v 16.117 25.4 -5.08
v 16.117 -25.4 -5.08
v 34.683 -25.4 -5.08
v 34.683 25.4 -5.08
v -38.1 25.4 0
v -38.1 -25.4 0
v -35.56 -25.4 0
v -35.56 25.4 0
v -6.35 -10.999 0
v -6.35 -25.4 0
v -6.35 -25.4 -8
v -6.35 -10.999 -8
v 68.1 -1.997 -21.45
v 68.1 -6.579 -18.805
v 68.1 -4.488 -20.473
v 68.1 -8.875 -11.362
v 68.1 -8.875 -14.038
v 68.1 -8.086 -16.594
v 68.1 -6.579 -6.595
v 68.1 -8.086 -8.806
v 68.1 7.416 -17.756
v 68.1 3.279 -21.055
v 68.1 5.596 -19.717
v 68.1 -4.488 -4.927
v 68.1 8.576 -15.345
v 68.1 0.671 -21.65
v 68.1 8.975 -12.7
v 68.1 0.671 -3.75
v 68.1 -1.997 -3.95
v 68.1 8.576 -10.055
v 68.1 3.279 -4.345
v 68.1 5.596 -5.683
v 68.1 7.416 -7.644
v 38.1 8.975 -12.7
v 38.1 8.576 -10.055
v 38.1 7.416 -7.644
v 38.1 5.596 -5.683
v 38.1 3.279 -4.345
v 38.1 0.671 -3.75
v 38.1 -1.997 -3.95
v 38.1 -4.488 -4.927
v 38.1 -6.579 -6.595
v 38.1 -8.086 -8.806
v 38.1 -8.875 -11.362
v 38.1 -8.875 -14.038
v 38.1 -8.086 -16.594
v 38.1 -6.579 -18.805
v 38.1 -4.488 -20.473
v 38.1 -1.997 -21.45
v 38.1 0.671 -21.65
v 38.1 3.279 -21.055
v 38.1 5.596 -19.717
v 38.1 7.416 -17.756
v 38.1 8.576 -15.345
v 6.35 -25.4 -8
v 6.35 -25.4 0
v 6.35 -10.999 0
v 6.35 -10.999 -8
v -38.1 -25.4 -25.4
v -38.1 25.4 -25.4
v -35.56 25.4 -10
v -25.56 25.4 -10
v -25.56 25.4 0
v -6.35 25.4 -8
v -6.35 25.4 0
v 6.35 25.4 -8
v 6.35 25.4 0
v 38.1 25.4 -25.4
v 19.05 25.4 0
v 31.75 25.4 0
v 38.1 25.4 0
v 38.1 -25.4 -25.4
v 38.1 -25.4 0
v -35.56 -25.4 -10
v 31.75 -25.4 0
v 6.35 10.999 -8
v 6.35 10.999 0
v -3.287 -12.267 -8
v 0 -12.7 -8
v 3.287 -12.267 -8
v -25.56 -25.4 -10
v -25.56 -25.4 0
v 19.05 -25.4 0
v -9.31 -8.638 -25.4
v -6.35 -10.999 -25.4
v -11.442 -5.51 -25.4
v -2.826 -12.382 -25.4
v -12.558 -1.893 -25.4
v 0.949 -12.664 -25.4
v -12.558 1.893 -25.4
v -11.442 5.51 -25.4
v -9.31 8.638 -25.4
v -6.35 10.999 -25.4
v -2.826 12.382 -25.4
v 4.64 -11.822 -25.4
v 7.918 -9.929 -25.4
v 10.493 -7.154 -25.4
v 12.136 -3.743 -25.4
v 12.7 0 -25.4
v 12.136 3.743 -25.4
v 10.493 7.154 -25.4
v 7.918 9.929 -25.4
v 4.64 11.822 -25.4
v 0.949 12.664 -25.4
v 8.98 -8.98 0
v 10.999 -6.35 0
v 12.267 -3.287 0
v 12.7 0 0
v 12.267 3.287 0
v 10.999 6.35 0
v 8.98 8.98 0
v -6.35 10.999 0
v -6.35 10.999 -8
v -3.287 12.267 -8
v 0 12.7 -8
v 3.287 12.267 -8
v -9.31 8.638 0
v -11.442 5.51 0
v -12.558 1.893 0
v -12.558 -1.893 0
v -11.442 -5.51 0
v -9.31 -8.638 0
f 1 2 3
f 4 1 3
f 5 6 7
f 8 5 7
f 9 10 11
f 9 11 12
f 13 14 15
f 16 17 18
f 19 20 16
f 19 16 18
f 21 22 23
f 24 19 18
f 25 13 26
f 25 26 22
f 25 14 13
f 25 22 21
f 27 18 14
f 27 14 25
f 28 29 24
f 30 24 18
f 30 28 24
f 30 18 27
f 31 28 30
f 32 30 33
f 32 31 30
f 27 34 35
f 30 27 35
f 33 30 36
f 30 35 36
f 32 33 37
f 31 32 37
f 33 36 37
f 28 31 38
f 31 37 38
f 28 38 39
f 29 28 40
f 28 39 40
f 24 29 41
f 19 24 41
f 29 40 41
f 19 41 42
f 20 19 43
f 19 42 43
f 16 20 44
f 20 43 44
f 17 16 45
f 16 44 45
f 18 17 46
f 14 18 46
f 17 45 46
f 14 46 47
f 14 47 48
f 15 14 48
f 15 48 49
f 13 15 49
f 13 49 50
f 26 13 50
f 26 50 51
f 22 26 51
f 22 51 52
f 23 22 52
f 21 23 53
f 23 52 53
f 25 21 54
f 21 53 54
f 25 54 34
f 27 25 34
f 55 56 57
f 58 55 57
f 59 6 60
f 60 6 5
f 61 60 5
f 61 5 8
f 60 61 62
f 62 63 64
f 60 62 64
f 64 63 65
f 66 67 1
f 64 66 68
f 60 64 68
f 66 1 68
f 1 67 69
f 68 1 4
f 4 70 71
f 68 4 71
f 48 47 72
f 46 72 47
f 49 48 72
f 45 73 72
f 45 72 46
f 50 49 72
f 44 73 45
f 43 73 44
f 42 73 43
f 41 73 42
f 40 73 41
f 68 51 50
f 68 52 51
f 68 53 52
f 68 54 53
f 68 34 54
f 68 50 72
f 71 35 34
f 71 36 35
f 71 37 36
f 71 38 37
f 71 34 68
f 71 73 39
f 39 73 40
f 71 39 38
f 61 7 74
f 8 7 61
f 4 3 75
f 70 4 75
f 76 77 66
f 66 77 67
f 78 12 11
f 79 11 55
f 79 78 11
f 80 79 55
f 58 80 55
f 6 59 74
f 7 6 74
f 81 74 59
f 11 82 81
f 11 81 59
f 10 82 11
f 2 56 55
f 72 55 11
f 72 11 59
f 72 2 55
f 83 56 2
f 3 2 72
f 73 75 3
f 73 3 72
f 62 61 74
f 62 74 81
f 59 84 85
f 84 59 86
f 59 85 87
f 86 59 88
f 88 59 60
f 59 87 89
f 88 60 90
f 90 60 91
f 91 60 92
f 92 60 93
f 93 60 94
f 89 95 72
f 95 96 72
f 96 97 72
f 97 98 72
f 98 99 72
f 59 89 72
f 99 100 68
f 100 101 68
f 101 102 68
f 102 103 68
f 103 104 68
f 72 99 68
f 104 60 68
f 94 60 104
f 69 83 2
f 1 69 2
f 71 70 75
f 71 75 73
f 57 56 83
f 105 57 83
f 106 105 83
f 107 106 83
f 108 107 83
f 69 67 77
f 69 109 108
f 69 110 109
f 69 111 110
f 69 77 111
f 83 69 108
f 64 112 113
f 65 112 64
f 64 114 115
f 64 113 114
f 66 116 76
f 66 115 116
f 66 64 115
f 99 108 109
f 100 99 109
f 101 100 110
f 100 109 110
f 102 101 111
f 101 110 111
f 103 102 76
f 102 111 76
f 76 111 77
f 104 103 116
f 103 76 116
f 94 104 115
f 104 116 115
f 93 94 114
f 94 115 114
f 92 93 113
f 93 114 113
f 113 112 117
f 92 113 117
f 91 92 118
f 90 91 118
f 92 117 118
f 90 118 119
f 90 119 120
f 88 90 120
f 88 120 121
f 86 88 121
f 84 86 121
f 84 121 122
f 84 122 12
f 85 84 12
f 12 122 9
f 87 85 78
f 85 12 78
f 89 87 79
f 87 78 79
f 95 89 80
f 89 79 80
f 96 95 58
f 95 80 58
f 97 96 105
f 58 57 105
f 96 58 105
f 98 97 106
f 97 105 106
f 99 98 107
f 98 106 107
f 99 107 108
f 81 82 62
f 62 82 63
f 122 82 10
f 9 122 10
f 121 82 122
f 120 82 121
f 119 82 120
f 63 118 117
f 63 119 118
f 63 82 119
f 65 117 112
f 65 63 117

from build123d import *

# Parameters (mm, degrees)
F0_W     = 76.2
F0_H     = 50.8
F0_R     = 12.7
F1_DEPTH = 25.4
F2_W     = 10
F2_H     = 50.8
F3_DEPTH = 10
F2_W_2   = 12.7
F4_DEPTH = 8
F5_R     = 8.975174
F6_DEPTH = 30
F8_DEPTH = 50.8


with BuildPart() as f1:
    # F0 (on Top) → F1 (new body)
    with BuildSketch(Plane.XY):
        Rectangle(F0_W, F0_H)
        Circle(F0_R, mode=Mode.SUBTRACT)
    extrude(amount=-F1_DEPTH)

    # F2 (on Top) → F3 (cut)
    with BuildSketch(Plane.XY):
        with Locations((-30.56, 0)):
            Rectangle(F2_W, F2_H)
    extrude(amount=-F3_DEPTH, mode=Mode.SUBTRACT)

    # F2 (on Top) → F4 (cut)
    with BuildSketch(Plane.XY):
        Rectangle(F2_W_2, F2_H)
    extrude(amount=-F4_DEPTH, mode=Mode.SUBTRACT)

    # F5 (on face) → F6 (join)
    with BuildSketch(Plane.YZ.offset(38.1)):
        with Locations((0, -12.7)):
            Circle(F5_R)
    extrude(amount=F6_DEPTH)

    # F7 (on face) → F8 (cut)
    with BuildSketch(Plane.XZ.offset(25.4)):
        Polygon((31.75, 0), (19.05, 0), (16.117061, -5.08), (34.682939, -5.08), align=None)
    extrude(amount=-F8_DEPTH, mode=Mode.SUBTRACT)


solid = f1.part
